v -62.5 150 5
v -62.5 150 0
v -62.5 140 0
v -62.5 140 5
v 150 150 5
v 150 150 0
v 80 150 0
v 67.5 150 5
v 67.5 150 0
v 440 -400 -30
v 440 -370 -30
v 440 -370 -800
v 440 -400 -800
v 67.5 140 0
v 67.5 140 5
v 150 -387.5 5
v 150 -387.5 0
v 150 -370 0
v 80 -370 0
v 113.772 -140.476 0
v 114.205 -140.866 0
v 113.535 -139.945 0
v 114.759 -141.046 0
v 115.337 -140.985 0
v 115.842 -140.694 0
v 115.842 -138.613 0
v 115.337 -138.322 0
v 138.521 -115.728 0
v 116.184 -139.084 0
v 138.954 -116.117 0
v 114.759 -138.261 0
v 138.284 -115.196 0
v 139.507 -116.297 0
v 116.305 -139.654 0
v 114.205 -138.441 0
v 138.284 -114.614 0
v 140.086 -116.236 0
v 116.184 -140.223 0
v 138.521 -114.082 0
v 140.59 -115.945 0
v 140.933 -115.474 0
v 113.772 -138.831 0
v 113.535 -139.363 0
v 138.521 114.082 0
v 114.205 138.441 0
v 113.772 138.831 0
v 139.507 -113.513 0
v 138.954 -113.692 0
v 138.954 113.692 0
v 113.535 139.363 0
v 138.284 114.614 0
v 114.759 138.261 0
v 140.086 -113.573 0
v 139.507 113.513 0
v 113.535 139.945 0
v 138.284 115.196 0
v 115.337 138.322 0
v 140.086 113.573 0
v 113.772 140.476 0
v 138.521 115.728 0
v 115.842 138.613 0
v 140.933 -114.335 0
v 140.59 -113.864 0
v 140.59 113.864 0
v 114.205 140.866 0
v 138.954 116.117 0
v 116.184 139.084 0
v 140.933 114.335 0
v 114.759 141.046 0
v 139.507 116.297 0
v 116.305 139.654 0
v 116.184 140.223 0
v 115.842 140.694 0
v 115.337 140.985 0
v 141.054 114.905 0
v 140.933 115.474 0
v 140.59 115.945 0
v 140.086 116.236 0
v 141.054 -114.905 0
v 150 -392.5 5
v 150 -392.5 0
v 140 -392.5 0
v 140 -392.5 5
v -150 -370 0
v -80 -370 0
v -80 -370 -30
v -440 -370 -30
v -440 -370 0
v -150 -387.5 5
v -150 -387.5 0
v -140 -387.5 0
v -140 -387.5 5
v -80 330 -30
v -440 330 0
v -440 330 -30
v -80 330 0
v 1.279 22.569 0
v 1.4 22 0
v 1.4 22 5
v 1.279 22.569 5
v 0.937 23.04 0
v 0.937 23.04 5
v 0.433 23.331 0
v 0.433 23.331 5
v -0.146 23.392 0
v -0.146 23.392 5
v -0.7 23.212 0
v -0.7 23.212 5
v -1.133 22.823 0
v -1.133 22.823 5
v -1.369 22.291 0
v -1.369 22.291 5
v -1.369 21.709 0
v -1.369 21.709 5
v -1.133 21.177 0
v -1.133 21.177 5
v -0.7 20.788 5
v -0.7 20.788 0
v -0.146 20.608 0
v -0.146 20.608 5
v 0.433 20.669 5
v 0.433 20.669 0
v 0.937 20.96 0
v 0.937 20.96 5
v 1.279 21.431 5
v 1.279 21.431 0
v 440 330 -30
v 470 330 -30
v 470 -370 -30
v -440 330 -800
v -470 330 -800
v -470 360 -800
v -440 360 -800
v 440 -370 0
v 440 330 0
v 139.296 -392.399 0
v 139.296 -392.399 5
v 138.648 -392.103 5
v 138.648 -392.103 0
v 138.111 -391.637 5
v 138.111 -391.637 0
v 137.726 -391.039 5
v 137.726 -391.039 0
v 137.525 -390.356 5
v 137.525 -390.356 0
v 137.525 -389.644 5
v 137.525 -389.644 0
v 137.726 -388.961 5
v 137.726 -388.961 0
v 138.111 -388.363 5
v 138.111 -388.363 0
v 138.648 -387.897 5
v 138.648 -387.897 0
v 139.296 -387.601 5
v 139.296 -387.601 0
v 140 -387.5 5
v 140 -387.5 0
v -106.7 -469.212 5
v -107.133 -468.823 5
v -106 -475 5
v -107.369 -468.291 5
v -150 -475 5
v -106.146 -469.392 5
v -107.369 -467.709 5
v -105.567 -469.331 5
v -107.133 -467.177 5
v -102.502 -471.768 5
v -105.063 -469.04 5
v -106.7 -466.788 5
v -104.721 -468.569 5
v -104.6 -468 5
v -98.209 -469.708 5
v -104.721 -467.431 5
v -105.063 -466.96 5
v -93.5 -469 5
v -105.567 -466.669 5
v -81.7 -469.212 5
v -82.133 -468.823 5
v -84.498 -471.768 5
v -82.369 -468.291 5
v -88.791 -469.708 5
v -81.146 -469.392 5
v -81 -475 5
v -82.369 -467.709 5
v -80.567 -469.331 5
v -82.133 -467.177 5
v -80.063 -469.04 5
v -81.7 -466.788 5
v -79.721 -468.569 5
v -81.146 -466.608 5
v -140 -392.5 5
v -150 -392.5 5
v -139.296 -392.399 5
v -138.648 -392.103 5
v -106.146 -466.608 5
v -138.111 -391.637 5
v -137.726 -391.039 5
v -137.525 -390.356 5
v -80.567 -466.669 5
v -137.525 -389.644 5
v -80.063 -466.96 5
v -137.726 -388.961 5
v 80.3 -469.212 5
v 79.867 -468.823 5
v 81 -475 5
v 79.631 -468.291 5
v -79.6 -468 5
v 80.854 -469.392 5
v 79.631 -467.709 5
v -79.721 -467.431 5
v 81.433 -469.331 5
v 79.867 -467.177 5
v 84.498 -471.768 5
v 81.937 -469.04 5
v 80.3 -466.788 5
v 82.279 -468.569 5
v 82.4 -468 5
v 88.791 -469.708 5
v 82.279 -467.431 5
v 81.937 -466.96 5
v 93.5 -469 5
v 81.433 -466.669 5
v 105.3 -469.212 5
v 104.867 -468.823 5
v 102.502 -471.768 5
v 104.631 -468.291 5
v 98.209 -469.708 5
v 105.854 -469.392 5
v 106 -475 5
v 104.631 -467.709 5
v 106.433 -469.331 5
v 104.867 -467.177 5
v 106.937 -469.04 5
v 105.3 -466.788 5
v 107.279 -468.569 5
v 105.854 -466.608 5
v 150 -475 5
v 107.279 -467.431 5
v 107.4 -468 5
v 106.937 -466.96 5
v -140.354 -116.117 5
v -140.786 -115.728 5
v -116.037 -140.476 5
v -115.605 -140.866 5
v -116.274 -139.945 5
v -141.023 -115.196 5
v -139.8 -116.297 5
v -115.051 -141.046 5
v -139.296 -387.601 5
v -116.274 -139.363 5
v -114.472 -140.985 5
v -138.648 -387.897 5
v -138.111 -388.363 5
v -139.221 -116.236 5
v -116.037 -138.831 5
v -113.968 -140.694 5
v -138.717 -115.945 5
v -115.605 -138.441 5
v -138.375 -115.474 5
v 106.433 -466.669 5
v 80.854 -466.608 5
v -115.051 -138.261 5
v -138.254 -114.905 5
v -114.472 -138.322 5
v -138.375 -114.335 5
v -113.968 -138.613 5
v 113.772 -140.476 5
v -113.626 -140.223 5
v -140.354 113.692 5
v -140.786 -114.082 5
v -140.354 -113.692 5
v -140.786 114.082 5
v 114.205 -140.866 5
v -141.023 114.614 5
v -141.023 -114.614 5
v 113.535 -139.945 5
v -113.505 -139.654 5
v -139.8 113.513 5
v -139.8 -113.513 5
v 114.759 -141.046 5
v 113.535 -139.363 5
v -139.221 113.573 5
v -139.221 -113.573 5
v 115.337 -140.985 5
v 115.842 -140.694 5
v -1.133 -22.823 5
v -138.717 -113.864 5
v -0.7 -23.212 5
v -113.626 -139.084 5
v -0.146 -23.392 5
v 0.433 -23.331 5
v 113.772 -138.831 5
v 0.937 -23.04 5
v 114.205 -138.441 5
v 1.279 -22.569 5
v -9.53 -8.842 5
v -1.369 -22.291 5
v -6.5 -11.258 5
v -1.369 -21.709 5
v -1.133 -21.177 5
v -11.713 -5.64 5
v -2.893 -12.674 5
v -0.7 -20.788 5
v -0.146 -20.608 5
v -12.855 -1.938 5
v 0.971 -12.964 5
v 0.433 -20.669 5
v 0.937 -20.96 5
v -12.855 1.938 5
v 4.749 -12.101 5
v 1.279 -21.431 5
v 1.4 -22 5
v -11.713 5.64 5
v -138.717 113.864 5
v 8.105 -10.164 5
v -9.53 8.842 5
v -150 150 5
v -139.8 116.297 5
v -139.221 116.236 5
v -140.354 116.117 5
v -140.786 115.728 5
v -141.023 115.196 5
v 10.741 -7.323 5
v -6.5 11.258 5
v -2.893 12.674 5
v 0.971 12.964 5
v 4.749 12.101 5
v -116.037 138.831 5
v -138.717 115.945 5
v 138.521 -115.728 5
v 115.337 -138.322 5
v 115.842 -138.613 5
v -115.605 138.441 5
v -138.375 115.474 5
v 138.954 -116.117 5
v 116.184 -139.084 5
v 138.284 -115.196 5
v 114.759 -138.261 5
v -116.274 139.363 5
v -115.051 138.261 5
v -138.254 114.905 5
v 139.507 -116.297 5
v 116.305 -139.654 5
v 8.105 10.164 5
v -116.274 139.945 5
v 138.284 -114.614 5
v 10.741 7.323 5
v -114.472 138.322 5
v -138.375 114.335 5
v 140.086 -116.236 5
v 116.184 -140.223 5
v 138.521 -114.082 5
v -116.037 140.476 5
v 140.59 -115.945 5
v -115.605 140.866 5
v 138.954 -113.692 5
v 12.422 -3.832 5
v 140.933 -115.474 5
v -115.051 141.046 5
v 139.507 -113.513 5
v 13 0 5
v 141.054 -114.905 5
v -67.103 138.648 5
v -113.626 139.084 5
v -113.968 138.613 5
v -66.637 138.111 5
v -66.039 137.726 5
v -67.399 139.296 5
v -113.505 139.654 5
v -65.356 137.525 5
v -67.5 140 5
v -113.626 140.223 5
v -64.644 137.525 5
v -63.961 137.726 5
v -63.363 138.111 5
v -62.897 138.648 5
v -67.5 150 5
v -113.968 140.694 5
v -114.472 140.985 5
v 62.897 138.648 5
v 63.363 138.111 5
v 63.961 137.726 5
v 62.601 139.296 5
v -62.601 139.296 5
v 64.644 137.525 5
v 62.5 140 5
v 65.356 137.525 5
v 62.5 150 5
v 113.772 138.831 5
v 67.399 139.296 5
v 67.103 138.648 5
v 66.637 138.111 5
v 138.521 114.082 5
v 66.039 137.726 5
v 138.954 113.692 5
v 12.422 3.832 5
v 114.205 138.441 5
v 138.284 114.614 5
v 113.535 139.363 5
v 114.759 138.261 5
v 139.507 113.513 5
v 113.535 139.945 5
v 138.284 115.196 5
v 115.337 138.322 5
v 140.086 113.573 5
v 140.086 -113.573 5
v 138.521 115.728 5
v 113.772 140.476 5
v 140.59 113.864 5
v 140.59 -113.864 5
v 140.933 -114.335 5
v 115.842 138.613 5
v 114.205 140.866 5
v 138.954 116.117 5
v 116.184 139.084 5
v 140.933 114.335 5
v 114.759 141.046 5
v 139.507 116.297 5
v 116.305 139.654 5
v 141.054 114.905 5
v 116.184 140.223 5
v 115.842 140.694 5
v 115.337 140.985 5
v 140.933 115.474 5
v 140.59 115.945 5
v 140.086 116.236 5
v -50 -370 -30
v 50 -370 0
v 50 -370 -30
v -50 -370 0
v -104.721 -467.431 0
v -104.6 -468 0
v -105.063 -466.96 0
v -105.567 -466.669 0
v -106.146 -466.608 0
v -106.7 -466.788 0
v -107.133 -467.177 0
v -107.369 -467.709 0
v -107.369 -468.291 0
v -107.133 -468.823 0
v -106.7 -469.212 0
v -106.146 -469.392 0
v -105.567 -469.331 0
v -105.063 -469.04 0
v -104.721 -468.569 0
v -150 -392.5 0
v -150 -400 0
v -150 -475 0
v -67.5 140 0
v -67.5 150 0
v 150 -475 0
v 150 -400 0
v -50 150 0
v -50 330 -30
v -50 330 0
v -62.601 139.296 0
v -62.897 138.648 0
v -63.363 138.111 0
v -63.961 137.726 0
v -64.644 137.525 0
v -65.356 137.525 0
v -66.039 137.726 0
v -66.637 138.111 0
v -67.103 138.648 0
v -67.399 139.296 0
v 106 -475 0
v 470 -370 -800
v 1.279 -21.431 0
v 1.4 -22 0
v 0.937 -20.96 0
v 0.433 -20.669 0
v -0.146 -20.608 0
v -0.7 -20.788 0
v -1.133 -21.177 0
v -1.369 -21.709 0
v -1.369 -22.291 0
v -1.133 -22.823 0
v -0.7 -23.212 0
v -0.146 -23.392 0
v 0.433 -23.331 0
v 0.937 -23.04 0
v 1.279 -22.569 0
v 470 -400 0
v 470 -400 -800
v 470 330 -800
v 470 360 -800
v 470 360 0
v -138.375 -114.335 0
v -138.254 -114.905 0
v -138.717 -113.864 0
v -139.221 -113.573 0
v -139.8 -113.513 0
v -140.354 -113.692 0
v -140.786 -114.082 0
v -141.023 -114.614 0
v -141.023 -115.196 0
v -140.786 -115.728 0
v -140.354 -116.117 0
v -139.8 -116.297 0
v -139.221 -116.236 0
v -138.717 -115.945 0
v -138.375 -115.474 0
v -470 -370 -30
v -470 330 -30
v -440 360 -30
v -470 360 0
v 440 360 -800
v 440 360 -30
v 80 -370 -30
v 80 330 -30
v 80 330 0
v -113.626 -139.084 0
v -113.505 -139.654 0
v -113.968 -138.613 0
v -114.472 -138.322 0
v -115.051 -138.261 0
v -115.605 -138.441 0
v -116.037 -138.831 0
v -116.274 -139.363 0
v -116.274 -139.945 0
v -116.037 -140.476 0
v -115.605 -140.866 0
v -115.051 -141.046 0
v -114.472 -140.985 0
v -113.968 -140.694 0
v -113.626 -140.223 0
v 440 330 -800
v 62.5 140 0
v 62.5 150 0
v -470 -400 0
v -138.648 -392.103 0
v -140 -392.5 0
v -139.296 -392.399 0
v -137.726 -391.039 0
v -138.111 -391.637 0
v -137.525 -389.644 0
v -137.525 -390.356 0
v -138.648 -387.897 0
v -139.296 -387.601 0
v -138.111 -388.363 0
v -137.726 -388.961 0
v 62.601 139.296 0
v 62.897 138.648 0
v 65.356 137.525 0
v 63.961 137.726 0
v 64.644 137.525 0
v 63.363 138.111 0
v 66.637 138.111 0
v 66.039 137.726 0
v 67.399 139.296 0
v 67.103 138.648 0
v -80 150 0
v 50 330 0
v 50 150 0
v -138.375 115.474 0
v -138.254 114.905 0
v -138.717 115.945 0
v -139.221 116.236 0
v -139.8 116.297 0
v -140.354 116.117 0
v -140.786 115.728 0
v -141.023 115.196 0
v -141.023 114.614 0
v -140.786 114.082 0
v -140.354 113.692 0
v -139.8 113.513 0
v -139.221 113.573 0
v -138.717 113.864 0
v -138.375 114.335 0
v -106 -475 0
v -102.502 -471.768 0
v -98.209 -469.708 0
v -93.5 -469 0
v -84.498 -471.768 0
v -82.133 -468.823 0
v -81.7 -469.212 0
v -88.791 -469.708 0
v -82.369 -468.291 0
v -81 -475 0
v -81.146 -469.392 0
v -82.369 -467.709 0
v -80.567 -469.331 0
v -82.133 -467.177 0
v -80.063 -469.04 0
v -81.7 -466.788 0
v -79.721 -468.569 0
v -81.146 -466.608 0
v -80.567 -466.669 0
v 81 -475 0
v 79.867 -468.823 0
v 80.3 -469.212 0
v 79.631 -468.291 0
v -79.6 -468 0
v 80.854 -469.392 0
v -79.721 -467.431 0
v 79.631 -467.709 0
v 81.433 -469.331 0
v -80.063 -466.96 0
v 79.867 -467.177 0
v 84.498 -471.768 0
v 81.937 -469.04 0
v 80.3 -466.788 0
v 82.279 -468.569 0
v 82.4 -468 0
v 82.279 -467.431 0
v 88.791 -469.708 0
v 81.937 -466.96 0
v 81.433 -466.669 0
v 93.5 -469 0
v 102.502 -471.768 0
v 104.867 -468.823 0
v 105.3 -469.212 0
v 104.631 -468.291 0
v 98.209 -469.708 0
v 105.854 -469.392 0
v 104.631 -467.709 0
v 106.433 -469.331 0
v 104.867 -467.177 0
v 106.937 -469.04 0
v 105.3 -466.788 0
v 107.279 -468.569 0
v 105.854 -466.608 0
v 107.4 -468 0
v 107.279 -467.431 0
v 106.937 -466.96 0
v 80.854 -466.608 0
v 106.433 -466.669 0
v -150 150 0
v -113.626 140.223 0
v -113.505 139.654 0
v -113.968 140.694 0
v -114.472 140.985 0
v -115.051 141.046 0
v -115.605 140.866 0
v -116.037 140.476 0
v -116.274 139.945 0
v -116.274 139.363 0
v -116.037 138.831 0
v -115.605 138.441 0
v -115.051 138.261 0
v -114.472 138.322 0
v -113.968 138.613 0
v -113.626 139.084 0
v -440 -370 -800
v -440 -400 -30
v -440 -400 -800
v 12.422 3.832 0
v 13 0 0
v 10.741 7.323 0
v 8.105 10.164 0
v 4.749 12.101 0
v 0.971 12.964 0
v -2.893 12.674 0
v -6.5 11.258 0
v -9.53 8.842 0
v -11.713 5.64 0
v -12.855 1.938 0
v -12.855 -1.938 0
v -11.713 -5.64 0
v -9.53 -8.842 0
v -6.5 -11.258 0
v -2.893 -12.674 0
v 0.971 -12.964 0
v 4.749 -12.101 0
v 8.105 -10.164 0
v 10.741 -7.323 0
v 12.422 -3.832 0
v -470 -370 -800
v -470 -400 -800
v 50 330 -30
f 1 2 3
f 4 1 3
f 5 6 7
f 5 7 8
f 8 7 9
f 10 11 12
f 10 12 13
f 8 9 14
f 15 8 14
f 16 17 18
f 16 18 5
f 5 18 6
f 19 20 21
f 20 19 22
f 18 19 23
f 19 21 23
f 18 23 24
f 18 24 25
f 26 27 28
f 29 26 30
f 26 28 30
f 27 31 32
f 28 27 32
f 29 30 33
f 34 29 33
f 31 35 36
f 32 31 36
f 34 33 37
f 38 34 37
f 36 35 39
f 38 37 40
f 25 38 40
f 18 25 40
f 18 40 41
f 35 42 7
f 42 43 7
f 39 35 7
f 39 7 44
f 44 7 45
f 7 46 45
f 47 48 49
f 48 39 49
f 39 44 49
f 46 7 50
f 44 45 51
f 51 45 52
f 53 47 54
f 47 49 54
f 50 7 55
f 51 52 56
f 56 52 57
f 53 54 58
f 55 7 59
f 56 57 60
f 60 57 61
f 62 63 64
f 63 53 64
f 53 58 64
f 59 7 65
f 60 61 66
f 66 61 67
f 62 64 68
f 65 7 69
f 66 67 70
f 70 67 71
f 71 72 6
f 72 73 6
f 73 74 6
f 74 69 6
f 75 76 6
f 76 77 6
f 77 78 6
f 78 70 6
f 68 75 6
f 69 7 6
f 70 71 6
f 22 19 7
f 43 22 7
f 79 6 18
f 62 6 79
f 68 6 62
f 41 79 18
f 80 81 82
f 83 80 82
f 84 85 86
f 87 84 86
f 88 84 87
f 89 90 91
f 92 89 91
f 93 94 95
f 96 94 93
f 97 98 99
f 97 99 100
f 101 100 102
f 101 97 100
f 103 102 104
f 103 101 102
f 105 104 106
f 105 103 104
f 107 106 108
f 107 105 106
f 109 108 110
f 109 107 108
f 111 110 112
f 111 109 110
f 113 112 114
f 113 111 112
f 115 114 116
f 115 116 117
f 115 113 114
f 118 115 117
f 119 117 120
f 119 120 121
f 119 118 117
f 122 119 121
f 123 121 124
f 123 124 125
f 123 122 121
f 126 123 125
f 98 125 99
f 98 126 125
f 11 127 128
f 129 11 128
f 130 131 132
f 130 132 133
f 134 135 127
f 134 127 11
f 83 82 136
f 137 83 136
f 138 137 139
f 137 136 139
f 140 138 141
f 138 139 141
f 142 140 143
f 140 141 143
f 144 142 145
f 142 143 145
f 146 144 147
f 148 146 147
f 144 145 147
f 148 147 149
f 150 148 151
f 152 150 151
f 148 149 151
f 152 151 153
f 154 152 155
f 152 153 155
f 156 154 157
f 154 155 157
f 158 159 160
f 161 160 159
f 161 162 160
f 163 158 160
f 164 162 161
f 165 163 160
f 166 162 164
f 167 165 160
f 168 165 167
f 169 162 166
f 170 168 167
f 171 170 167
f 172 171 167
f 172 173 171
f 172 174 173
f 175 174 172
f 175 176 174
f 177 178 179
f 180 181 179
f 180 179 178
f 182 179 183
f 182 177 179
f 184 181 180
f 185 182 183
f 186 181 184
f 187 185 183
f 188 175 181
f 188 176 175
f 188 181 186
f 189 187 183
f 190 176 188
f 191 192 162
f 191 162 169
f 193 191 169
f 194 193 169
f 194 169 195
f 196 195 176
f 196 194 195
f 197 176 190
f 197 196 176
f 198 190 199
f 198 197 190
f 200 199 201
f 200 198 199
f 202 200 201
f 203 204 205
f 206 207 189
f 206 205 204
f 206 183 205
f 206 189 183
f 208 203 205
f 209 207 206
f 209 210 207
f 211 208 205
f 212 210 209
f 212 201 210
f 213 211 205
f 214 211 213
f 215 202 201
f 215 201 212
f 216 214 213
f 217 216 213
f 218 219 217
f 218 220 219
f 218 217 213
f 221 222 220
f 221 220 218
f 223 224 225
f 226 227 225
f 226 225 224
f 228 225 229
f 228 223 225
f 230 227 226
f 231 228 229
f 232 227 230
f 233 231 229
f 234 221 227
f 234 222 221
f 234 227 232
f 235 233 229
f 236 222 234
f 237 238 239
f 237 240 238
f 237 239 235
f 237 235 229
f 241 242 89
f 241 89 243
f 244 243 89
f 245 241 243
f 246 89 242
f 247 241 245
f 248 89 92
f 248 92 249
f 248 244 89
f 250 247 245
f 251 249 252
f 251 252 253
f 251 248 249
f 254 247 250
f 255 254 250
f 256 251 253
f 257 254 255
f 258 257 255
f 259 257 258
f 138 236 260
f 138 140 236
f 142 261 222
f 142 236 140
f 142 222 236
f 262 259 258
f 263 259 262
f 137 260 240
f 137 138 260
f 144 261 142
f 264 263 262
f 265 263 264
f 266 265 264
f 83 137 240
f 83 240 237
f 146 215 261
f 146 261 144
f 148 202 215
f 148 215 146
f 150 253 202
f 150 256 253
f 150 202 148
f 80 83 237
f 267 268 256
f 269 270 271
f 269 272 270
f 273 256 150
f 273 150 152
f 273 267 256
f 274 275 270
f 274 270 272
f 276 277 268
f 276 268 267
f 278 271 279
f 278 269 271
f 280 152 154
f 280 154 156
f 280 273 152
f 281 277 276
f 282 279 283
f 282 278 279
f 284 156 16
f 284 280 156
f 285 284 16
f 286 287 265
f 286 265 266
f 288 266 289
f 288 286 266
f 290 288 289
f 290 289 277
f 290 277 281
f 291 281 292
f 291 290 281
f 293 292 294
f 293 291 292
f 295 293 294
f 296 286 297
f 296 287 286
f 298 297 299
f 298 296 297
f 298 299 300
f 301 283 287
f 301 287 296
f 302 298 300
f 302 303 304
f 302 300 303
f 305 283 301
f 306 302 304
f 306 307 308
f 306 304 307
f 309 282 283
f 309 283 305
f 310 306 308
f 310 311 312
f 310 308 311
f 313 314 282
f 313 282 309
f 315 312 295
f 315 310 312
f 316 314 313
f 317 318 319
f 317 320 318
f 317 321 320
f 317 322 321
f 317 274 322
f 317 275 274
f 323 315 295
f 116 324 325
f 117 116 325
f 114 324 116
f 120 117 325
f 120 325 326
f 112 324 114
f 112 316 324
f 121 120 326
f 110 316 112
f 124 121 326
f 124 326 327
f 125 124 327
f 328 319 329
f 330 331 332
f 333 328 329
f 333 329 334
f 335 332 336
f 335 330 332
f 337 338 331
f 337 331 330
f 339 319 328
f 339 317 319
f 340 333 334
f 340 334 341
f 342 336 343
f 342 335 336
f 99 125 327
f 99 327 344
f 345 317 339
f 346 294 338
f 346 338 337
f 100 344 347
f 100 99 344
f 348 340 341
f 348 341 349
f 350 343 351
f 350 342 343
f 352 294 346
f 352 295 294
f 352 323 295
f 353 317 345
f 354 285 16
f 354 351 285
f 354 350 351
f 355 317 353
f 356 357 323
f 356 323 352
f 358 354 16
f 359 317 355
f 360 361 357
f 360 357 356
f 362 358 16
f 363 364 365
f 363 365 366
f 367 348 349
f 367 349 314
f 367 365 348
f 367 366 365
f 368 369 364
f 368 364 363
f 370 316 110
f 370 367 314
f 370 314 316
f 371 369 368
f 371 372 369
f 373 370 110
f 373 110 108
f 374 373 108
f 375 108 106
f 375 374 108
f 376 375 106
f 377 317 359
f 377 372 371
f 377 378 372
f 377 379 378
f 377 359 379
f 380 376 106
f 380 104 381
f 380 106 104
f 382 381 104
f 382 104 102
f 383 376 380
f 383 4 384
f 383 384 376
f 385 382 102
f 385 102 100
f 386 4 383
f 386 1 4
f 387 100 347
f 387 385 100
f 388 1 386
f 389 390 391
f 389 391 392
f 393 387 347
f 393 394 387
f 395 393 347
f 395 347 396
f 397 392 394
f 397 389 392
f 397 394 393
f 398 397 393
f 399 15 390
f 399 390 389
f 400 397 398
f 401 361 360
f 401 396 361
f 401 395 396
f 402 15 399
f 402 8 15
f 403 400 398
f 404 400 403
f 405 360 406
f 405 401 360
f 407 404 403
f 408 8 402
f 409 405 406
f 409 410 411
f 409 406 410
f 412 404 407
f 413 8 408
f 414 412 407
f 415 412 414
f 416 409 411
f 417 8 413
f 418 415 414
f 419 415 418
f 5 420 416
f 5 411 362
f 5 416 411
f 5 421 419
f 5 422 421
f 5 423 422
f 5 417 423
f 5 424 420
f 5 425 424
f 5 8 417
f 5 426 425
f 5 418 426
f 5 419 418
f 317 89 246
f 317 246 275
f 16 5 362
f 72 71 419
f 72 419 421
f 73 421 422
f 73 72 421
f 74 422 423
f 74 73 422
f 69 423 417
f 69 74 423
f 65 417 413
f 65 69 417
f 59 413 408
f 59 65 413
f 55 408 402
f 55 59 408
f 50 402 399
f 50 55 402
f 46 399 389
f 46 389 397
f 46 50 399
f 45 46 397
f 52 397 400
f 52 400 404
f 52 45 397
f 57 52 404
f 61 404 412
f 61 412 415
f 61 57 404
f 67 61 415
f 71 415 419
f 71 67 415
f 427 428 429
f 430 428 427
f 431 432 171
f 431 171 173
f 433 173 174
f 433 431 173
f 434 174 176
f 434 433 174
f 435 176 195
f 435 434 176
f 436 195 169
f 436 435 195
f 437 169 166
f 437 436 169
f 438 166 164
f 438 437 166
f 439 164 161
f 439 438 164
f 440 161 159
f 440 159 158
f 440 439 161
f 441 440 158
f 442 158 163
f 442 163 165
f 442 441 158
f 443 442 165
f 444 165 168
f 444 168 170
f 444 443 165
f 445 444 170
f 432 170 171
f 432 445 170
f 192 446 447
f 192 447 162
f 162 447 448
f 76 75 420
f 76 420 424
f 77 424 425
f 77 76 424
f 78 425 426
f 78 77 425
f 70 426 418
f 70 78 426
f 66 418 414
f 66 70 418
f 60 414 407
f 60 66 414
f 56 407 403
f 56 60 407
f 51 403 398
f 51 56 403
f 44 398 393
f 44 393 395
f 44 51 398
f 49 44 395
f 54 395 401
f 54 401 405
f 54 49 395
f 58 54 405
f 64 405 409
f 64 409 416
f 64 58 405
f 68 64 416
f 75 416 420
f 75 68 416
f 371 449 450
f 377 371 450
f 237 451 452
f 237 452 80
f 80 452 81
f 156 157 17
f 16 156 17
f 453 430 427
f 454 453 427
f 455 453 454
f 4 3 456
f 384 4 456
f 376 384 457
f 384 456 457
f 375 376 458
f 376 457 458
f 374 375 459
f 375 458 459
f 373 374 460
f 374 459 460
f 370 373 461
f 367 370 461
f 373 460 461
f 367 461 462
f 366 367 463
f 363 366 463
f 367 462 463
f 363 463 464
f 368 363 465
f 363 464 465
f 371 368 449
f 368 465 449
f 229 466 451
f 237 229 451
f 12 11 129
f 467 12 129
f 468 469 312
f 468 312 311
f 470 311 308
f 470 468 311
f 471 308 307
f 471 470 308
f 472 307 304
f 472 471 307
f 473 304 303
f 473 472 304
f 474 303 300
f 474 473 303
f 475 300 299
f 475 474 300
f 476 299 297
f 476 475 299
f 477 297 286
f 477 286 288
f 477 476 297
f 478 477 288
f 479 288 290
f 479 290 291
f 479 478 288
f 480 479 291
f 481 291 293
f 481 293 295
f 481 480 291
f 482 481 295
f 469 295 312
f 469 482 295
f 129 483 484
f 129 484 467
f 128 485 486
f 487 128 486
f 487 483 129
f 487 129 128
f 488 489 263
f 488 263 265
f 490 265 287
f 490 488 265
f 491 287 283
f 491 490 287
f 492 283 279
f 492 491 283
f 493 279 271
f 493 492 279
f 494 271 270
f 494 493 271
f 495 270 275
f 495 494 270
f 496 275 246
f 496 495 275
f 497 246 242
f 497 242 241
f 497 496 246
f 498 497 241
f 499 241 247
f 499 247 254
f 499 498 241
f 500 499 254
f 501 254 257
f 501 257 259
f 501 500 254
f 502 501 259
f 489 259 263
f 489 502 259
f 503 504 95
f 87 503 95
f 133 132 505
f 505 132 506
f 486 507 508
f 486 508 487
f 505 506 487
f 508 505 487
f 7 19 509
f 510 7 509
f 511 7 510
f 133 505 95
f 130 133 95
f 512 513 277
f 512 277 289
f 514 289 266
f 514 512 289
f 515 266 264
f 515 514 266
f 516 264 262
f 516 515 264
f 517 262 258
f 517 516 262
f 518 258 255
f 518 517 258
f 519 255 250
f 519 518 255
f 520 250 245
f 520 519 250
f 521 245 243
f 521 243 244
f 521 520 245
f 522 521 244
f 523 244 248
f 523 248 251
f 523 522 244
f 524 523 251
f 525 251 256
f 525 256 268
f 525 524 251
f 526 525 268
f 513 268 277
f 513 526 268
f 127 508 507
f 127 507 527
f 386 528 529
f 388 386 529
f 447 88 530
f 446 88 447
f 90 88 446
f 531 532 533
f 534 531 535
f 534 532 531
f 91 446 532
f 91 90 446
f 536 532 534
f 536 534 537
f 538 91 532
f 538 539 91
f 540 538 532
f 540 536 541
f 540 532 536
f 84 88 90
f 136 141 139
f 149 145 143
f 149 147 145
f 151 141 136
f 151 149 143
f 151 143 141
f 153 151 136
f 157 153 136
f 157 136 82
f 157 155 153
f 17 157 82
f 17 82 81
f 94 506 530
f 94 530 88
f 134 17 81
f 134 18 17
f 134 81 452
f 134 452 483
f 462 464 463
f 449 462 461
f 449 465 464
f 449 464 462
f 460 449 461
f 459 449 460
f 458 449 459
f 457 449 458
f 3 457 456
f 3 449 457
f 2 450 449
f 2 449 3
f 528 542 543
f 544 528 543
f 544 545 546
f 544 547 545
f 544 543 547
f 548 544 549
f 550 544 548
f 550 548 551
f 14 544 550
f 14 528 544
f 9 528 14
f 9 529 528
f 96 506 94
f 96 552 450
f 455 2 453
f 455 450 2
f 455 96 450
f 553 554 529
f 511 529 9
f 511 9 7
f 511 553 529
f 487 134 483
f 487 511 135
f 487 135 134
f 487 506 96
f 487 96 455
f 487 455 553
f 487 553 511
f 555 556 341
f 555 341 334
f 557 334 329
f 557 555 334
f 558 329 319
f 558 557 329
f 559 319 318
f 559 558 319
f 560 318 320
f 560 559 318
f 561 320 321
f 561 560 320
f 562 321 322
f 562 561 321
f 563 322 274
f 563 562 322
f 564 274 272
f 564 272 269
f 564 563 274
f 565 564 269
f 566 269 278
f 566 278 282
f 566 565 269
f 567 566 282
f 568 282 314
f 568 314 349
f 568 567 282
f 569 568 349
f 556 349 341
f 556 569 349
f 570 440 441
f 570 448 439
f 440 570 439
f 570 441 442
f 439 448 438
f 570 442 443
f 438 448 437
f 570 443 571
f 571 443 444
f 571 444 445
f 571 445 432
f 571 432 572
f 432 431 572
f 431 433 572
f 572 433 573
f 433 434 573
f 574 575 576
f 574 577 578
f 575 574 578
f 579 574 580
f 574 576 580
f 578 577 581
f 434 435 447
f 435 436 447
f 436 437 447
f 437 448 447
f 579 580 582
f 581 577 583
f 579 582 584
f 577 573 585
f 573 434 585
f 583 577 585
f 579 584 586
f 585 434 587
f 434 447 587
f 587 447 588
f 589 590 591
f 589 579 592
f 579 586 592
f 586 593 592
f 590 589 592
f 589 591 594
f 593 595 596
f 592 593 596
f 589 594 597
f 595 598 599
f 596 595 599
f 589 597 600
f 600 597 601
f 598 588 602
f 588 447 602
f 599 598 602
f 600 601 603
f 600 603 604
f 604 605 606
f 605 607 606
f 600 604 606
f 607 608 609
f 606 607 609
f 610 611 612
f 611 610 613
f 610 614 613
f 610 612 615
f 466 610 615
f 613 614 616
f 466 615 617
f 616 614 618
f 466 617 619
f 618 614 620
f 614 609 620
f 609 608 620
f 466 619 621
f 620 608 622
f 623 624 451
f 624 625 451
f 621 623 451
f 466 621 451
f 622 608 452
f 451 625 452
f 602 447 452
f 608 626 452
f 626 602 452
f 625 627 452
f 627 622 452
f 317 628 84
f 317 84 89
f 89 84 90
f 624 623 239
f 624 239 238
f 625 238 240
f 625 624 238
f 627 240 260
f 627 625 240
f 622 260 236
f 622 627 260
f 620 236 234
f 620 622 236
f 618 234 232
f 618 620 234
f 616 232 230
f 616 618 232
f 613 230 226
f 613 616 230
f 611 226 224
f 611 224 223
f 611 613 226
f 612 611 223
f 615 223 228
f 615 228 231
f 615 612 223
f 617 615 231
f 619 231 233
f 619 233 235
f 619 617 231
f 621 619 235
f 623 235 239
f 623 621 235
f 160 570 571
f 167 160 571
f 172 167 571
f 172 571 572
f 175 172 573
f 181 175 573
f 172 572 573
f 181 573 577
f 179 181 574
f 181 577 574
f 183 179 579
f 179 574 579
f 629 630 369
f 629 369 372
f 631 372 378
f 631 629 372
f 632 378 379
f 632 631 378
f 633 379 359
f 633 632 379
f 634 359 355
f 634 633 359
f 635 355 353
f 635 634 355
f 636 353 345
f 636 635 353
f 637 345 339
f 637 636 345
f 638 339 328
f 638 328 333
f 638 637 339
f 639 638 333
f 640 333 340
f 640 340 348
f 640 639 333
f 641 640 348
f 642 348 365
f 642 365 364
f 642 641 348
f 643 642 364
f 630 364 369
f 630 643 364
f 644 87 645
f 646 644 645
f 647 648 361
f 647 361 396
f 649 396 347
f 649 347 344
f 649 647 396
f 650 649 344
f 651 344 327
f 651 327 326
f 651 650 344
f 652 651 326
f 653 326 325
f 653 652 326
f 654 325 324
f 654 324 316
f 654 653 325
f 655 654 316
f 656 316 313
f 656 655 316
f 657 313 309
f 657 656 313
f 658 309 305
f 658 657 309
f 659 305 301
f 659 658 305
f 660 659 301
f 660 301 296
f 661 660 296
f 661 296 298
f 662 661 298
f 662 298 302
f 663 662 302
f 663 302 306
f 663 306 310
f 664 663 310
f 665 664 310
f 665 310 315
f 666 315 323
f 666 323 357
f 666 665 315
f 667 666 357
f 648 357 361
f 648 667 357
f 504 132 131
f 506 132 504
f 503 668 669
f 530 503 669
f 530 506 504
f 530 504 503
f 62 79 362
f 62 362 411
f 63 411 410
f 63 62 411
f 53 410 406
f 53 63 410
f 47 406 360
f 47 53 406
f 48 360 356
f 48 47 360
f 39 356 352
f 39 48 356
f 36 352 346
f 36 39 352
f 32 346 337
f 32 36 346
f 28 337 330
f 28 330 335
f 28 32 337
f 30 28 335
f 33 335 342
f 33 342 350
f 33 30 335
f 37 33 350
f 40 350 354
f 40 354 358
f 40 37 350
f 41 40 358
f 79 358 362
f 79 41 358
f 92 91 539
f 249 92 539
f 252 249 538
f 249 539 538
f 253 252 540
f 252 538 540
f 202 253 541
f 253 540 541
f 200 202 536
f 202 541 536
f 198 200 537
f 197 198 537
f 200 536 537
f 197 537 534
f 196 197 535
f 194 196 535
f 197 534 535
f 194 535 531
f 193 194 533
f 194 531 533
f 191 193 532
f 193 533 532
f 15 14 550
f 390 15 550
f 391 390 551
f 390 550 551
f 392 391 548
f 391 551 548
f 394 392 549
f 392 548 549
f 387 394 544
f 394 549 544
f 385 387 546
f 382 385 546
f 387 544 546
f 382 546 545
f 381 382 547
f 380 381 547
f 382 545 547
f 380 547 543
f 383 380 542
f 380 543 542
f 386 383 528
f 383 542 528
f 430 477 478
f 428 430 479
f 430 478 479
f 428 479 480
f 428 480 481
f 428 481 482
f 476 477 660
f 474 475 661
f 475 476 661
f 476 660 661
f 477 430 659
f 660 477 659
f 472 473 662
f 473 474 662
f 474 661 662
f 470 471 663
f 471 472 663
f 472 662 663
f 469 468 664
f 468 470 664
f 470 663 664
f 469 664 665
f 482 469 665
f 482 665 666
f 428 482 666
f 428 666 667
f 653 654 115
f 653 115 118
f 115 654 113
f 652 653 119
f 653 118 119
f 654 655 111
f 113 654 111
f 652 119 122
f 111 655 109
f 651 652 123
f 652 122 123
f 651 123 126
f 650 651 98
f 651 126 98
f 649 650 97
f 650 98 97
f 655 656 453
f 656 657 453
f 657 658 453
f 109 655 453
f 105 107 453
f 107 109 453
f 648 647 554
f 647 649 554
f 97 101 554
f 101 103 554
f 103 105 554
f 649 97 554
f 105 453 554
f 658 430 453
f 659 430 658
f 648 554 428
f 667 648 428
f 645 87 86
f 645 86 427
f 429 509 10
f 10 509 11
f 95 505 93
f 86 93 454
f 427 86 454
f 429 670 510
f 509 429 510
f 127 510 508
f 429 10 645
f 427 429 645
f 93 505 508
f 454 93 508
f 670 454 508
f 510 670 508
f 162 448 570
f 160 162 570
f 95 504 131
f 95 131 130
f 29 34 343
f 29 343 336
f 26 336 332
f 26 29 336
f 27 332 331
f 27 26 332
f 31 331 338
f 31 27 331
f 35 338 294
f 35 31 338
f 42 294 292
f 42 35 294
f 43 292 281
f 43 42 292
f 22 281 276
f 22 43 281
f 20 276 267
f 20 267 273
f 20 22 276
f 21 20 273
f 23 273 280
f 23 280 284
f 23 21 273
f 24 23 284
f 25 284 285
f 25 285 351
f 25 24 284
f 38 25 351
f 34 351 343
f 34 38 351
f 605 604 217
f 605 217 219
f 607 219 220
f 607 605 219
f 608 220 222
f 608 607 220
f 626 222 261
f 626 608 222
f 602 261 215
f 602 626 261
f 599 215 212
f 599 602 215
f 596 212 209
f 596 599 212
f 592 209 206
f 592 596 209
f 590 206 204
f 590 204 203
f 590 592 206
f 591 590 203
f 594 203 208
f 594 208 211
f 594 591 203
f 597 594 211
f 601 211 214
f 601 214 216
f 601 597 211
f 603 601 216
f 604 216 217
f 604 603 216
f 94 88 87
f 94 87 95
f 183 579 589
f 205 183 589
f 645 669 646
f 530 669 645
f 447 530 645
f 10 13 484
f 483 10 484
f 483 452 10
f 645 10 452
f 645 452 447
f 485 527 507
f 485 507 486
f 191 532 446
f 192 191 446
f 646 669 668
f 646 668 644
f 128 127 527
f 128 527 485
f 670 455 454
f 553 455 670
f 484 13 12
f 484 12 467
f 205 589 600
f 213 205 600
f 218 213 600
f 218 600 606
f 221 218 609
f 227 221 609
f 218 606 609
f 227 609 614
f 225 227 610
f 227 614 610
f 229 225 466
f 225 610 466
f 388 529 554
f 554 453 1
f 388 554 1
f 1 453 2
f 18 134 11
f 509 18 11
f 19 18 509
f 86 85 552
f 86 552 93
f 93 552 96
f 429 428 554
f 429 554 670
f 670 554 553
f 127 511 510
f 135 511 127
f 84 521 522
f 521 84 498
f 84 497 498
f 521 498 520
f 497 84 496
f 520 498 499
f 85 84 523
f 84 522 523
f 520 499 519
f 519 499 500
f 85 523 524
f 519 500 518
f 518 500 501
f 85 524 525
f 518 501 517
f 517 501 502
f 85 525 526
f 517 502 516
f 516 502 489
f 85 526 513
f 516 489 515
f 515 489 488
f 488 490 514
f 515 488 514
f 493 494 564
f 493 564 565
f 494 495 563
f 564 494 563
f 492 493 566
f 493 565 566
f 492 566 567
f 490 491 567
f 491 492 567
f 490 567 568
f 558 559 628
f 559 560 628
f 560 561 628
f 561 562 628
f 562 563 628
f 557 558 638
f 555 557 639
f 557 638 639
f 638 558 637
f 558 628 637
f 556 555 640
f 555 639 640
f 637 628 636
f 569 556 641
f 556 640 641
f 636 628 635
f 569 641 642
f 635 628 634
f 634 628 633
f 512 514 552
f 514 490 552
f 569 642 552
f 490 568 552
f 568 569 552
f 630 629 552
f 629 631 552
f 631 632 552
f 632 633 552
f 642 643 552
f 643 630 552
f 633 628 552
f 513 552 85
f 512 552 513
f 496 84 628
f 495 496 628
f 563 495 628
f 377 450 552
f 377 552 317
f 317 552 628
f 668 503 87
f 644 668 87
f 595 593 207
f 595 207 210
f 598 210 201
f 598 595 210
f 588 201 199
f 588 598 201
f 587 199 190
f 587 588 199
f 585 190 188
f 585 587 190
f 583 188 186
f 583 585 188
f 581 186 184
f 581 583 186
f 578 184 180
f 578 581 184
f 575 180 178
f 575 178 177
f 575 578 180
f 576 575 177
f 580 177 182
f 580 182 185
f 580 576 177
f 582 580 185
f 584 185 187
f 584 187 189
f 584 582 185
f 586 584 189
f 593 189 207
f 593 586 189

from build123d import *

# Parameters (mm, degrees)
F1_W     = 940
F1_H     = 760
F1_W_2   = 30
F1_H_2   = 700
F2_DEPTH = 30
F0_R     = 1.4
F0_R_2   = 13
F3_DEPTH = 5
F4_W     = 30
F4_H     = 30
F5_DEPTH = 770


with BuildPart() as f2:
    # F1 (on Top) → F2 (new body)
    with BuildSketch(Plane.XY):
        with Locations((0, -20)):
            Rectangle(F1_W, F1_H)
        Polygon((-440, -370), (-440, 330), (-80, 330), (-50, 330), (50, 330), (80, 330), (440, 330), (440, -370), (80, -370), (50, -370), (-50, -370), (-80, -370), align=None, mode=Mode.SUBTRACT)
        with Locations((-65, -20)):
            Rectangle(F1_W_2, F1_H_2)
        with Locations((65, -20)):
            Rectangle(F1_W_2, F1_H_2)
    extrude(amount=-F2_DEPTH)

    # F0 (on Top) → F3 (join)
    with BuildSketch(Plane.XY):
        with BuildLine():
            Line((-67.5, 150), (-150, 150))
            Line((-150, 150), (-150, -387.5))
            Line((-150, -387.5), (-140, -387.5))
            ThreePointArc((-140, -387.5), (-137.5, -390), (-140, -392.5))
            Line((-140, -392.5), (-150, -392.5))
            Line((-150, -392.5), (-150, -475))
            Line((-150, -475), (-106, -475))
            ThreePointArc((-106, -475), (-93.5, -469), (-81, -475))
            Line((-81, -475), (0, -475))
            Line((0, -475), (81, -475))
            ThreePointArc((81, -475), (93.5, -469), (106, -475))
            Line((106, -475), (150, -475))
            Line((150, -475), (150, -392.5))
            Line((150, -392.5), (140, -392.5))
            ThreePointArc((140, -392.5), (137.5, -390), (140, -387.5))
            Line((140, -387.5), (150, -387.5))
            Line((150, -387.5), (150, 150))
            Line((150, 150), (67.5, 150))
            Line((67.5, 150), (67.5, 140))
            ThreePointArc((67.5, 140), (65, 137.5), (62.5, 140))
            Line((62.5, 140), (62.5, 150))
            Line((62.5, 150), (-62.5, 150))
            Line((-62.5, 150), (-62.5, 140))
            ThreePointArc((-62.5, 140), (-65, 137.5), (-67.5, 140))
            Line((-67.5, 140), (-67.5, 150))
        make_face()
        with Locations((-106, -468)):
            Circle(F0_R, mode=Mode.SUBTRACT)
        with Locations((-81, -468)):
            Circle(F0_R, mode=Mode.SUBTRACT)
        with Locations((81, -468)):
            Circle(F0_R, mode=Mode.SUBTRACT)
        with Locations((106, -468)):
            Circle(F0_R, mode=Mode.SUBTRACT)
        with Locations((-114.904852, -139.653589)):
            Circle(F0_R, mode=Mode.SUBTRACT)
        with Locations((-139.653589, -114.904852)):
            Circle(F0_R, mode=Mode.SUBTRACT)
        with Locations((-139.653589, 114.904852)):
            Circle(F0_R, mode=Mode.SUBTRACT)
        with Locations((-114.904852, 139.653589)):
            Circle(F0_R, mode=Mode.SUBTRACT)
        with Locations((0, -22)):
            Circle(F0_R, mode=Mode.SUBTRACT)
        with Locations((114.904852, -139.653589)):
            Circle(F0_R, mode=Mode.SUBTRACT)
        with Locations((139.653589, -114.904852)):
            Circle(F0_R, mode=Mode.SUBTRACT)
        Circle(F0_R_2, mode=Mode.SUBTRACT)
        with Locations((0, 22)):
            Circle(F0_R, mode=Mode.SUBTRACT)
        with Locations((114.904852, 139.653589)):
            Circle(F0_R, mode=Mode.SUBTRACT)
        with Locations((139.653589, 114.904852)):
            Circle(F0_R, mode=Mode.SUBTRACT)
    extrude(amount=F3_DEPTH)

    # F4 (on face) → F5 (join)
    with BuildSketch(Plane(origin=(0, 0, -30), x_dir=(1, 0, 0), z_dir=(0, 0, -1))):
        with Locations((-455, 385)):
            Rectangle(F4_W, F4_H)
        with Locations((-455, -345)):
            Rectangle(F4_W, F4_H)
        with Locations((455, -345)):
            Rectangle(F4_W, F4_H)
        with Locations((455, 385)):
            Rectangle(F4_W, F4_H)
    extrude(amount=F5_DEPTH)


solid = f2.part
